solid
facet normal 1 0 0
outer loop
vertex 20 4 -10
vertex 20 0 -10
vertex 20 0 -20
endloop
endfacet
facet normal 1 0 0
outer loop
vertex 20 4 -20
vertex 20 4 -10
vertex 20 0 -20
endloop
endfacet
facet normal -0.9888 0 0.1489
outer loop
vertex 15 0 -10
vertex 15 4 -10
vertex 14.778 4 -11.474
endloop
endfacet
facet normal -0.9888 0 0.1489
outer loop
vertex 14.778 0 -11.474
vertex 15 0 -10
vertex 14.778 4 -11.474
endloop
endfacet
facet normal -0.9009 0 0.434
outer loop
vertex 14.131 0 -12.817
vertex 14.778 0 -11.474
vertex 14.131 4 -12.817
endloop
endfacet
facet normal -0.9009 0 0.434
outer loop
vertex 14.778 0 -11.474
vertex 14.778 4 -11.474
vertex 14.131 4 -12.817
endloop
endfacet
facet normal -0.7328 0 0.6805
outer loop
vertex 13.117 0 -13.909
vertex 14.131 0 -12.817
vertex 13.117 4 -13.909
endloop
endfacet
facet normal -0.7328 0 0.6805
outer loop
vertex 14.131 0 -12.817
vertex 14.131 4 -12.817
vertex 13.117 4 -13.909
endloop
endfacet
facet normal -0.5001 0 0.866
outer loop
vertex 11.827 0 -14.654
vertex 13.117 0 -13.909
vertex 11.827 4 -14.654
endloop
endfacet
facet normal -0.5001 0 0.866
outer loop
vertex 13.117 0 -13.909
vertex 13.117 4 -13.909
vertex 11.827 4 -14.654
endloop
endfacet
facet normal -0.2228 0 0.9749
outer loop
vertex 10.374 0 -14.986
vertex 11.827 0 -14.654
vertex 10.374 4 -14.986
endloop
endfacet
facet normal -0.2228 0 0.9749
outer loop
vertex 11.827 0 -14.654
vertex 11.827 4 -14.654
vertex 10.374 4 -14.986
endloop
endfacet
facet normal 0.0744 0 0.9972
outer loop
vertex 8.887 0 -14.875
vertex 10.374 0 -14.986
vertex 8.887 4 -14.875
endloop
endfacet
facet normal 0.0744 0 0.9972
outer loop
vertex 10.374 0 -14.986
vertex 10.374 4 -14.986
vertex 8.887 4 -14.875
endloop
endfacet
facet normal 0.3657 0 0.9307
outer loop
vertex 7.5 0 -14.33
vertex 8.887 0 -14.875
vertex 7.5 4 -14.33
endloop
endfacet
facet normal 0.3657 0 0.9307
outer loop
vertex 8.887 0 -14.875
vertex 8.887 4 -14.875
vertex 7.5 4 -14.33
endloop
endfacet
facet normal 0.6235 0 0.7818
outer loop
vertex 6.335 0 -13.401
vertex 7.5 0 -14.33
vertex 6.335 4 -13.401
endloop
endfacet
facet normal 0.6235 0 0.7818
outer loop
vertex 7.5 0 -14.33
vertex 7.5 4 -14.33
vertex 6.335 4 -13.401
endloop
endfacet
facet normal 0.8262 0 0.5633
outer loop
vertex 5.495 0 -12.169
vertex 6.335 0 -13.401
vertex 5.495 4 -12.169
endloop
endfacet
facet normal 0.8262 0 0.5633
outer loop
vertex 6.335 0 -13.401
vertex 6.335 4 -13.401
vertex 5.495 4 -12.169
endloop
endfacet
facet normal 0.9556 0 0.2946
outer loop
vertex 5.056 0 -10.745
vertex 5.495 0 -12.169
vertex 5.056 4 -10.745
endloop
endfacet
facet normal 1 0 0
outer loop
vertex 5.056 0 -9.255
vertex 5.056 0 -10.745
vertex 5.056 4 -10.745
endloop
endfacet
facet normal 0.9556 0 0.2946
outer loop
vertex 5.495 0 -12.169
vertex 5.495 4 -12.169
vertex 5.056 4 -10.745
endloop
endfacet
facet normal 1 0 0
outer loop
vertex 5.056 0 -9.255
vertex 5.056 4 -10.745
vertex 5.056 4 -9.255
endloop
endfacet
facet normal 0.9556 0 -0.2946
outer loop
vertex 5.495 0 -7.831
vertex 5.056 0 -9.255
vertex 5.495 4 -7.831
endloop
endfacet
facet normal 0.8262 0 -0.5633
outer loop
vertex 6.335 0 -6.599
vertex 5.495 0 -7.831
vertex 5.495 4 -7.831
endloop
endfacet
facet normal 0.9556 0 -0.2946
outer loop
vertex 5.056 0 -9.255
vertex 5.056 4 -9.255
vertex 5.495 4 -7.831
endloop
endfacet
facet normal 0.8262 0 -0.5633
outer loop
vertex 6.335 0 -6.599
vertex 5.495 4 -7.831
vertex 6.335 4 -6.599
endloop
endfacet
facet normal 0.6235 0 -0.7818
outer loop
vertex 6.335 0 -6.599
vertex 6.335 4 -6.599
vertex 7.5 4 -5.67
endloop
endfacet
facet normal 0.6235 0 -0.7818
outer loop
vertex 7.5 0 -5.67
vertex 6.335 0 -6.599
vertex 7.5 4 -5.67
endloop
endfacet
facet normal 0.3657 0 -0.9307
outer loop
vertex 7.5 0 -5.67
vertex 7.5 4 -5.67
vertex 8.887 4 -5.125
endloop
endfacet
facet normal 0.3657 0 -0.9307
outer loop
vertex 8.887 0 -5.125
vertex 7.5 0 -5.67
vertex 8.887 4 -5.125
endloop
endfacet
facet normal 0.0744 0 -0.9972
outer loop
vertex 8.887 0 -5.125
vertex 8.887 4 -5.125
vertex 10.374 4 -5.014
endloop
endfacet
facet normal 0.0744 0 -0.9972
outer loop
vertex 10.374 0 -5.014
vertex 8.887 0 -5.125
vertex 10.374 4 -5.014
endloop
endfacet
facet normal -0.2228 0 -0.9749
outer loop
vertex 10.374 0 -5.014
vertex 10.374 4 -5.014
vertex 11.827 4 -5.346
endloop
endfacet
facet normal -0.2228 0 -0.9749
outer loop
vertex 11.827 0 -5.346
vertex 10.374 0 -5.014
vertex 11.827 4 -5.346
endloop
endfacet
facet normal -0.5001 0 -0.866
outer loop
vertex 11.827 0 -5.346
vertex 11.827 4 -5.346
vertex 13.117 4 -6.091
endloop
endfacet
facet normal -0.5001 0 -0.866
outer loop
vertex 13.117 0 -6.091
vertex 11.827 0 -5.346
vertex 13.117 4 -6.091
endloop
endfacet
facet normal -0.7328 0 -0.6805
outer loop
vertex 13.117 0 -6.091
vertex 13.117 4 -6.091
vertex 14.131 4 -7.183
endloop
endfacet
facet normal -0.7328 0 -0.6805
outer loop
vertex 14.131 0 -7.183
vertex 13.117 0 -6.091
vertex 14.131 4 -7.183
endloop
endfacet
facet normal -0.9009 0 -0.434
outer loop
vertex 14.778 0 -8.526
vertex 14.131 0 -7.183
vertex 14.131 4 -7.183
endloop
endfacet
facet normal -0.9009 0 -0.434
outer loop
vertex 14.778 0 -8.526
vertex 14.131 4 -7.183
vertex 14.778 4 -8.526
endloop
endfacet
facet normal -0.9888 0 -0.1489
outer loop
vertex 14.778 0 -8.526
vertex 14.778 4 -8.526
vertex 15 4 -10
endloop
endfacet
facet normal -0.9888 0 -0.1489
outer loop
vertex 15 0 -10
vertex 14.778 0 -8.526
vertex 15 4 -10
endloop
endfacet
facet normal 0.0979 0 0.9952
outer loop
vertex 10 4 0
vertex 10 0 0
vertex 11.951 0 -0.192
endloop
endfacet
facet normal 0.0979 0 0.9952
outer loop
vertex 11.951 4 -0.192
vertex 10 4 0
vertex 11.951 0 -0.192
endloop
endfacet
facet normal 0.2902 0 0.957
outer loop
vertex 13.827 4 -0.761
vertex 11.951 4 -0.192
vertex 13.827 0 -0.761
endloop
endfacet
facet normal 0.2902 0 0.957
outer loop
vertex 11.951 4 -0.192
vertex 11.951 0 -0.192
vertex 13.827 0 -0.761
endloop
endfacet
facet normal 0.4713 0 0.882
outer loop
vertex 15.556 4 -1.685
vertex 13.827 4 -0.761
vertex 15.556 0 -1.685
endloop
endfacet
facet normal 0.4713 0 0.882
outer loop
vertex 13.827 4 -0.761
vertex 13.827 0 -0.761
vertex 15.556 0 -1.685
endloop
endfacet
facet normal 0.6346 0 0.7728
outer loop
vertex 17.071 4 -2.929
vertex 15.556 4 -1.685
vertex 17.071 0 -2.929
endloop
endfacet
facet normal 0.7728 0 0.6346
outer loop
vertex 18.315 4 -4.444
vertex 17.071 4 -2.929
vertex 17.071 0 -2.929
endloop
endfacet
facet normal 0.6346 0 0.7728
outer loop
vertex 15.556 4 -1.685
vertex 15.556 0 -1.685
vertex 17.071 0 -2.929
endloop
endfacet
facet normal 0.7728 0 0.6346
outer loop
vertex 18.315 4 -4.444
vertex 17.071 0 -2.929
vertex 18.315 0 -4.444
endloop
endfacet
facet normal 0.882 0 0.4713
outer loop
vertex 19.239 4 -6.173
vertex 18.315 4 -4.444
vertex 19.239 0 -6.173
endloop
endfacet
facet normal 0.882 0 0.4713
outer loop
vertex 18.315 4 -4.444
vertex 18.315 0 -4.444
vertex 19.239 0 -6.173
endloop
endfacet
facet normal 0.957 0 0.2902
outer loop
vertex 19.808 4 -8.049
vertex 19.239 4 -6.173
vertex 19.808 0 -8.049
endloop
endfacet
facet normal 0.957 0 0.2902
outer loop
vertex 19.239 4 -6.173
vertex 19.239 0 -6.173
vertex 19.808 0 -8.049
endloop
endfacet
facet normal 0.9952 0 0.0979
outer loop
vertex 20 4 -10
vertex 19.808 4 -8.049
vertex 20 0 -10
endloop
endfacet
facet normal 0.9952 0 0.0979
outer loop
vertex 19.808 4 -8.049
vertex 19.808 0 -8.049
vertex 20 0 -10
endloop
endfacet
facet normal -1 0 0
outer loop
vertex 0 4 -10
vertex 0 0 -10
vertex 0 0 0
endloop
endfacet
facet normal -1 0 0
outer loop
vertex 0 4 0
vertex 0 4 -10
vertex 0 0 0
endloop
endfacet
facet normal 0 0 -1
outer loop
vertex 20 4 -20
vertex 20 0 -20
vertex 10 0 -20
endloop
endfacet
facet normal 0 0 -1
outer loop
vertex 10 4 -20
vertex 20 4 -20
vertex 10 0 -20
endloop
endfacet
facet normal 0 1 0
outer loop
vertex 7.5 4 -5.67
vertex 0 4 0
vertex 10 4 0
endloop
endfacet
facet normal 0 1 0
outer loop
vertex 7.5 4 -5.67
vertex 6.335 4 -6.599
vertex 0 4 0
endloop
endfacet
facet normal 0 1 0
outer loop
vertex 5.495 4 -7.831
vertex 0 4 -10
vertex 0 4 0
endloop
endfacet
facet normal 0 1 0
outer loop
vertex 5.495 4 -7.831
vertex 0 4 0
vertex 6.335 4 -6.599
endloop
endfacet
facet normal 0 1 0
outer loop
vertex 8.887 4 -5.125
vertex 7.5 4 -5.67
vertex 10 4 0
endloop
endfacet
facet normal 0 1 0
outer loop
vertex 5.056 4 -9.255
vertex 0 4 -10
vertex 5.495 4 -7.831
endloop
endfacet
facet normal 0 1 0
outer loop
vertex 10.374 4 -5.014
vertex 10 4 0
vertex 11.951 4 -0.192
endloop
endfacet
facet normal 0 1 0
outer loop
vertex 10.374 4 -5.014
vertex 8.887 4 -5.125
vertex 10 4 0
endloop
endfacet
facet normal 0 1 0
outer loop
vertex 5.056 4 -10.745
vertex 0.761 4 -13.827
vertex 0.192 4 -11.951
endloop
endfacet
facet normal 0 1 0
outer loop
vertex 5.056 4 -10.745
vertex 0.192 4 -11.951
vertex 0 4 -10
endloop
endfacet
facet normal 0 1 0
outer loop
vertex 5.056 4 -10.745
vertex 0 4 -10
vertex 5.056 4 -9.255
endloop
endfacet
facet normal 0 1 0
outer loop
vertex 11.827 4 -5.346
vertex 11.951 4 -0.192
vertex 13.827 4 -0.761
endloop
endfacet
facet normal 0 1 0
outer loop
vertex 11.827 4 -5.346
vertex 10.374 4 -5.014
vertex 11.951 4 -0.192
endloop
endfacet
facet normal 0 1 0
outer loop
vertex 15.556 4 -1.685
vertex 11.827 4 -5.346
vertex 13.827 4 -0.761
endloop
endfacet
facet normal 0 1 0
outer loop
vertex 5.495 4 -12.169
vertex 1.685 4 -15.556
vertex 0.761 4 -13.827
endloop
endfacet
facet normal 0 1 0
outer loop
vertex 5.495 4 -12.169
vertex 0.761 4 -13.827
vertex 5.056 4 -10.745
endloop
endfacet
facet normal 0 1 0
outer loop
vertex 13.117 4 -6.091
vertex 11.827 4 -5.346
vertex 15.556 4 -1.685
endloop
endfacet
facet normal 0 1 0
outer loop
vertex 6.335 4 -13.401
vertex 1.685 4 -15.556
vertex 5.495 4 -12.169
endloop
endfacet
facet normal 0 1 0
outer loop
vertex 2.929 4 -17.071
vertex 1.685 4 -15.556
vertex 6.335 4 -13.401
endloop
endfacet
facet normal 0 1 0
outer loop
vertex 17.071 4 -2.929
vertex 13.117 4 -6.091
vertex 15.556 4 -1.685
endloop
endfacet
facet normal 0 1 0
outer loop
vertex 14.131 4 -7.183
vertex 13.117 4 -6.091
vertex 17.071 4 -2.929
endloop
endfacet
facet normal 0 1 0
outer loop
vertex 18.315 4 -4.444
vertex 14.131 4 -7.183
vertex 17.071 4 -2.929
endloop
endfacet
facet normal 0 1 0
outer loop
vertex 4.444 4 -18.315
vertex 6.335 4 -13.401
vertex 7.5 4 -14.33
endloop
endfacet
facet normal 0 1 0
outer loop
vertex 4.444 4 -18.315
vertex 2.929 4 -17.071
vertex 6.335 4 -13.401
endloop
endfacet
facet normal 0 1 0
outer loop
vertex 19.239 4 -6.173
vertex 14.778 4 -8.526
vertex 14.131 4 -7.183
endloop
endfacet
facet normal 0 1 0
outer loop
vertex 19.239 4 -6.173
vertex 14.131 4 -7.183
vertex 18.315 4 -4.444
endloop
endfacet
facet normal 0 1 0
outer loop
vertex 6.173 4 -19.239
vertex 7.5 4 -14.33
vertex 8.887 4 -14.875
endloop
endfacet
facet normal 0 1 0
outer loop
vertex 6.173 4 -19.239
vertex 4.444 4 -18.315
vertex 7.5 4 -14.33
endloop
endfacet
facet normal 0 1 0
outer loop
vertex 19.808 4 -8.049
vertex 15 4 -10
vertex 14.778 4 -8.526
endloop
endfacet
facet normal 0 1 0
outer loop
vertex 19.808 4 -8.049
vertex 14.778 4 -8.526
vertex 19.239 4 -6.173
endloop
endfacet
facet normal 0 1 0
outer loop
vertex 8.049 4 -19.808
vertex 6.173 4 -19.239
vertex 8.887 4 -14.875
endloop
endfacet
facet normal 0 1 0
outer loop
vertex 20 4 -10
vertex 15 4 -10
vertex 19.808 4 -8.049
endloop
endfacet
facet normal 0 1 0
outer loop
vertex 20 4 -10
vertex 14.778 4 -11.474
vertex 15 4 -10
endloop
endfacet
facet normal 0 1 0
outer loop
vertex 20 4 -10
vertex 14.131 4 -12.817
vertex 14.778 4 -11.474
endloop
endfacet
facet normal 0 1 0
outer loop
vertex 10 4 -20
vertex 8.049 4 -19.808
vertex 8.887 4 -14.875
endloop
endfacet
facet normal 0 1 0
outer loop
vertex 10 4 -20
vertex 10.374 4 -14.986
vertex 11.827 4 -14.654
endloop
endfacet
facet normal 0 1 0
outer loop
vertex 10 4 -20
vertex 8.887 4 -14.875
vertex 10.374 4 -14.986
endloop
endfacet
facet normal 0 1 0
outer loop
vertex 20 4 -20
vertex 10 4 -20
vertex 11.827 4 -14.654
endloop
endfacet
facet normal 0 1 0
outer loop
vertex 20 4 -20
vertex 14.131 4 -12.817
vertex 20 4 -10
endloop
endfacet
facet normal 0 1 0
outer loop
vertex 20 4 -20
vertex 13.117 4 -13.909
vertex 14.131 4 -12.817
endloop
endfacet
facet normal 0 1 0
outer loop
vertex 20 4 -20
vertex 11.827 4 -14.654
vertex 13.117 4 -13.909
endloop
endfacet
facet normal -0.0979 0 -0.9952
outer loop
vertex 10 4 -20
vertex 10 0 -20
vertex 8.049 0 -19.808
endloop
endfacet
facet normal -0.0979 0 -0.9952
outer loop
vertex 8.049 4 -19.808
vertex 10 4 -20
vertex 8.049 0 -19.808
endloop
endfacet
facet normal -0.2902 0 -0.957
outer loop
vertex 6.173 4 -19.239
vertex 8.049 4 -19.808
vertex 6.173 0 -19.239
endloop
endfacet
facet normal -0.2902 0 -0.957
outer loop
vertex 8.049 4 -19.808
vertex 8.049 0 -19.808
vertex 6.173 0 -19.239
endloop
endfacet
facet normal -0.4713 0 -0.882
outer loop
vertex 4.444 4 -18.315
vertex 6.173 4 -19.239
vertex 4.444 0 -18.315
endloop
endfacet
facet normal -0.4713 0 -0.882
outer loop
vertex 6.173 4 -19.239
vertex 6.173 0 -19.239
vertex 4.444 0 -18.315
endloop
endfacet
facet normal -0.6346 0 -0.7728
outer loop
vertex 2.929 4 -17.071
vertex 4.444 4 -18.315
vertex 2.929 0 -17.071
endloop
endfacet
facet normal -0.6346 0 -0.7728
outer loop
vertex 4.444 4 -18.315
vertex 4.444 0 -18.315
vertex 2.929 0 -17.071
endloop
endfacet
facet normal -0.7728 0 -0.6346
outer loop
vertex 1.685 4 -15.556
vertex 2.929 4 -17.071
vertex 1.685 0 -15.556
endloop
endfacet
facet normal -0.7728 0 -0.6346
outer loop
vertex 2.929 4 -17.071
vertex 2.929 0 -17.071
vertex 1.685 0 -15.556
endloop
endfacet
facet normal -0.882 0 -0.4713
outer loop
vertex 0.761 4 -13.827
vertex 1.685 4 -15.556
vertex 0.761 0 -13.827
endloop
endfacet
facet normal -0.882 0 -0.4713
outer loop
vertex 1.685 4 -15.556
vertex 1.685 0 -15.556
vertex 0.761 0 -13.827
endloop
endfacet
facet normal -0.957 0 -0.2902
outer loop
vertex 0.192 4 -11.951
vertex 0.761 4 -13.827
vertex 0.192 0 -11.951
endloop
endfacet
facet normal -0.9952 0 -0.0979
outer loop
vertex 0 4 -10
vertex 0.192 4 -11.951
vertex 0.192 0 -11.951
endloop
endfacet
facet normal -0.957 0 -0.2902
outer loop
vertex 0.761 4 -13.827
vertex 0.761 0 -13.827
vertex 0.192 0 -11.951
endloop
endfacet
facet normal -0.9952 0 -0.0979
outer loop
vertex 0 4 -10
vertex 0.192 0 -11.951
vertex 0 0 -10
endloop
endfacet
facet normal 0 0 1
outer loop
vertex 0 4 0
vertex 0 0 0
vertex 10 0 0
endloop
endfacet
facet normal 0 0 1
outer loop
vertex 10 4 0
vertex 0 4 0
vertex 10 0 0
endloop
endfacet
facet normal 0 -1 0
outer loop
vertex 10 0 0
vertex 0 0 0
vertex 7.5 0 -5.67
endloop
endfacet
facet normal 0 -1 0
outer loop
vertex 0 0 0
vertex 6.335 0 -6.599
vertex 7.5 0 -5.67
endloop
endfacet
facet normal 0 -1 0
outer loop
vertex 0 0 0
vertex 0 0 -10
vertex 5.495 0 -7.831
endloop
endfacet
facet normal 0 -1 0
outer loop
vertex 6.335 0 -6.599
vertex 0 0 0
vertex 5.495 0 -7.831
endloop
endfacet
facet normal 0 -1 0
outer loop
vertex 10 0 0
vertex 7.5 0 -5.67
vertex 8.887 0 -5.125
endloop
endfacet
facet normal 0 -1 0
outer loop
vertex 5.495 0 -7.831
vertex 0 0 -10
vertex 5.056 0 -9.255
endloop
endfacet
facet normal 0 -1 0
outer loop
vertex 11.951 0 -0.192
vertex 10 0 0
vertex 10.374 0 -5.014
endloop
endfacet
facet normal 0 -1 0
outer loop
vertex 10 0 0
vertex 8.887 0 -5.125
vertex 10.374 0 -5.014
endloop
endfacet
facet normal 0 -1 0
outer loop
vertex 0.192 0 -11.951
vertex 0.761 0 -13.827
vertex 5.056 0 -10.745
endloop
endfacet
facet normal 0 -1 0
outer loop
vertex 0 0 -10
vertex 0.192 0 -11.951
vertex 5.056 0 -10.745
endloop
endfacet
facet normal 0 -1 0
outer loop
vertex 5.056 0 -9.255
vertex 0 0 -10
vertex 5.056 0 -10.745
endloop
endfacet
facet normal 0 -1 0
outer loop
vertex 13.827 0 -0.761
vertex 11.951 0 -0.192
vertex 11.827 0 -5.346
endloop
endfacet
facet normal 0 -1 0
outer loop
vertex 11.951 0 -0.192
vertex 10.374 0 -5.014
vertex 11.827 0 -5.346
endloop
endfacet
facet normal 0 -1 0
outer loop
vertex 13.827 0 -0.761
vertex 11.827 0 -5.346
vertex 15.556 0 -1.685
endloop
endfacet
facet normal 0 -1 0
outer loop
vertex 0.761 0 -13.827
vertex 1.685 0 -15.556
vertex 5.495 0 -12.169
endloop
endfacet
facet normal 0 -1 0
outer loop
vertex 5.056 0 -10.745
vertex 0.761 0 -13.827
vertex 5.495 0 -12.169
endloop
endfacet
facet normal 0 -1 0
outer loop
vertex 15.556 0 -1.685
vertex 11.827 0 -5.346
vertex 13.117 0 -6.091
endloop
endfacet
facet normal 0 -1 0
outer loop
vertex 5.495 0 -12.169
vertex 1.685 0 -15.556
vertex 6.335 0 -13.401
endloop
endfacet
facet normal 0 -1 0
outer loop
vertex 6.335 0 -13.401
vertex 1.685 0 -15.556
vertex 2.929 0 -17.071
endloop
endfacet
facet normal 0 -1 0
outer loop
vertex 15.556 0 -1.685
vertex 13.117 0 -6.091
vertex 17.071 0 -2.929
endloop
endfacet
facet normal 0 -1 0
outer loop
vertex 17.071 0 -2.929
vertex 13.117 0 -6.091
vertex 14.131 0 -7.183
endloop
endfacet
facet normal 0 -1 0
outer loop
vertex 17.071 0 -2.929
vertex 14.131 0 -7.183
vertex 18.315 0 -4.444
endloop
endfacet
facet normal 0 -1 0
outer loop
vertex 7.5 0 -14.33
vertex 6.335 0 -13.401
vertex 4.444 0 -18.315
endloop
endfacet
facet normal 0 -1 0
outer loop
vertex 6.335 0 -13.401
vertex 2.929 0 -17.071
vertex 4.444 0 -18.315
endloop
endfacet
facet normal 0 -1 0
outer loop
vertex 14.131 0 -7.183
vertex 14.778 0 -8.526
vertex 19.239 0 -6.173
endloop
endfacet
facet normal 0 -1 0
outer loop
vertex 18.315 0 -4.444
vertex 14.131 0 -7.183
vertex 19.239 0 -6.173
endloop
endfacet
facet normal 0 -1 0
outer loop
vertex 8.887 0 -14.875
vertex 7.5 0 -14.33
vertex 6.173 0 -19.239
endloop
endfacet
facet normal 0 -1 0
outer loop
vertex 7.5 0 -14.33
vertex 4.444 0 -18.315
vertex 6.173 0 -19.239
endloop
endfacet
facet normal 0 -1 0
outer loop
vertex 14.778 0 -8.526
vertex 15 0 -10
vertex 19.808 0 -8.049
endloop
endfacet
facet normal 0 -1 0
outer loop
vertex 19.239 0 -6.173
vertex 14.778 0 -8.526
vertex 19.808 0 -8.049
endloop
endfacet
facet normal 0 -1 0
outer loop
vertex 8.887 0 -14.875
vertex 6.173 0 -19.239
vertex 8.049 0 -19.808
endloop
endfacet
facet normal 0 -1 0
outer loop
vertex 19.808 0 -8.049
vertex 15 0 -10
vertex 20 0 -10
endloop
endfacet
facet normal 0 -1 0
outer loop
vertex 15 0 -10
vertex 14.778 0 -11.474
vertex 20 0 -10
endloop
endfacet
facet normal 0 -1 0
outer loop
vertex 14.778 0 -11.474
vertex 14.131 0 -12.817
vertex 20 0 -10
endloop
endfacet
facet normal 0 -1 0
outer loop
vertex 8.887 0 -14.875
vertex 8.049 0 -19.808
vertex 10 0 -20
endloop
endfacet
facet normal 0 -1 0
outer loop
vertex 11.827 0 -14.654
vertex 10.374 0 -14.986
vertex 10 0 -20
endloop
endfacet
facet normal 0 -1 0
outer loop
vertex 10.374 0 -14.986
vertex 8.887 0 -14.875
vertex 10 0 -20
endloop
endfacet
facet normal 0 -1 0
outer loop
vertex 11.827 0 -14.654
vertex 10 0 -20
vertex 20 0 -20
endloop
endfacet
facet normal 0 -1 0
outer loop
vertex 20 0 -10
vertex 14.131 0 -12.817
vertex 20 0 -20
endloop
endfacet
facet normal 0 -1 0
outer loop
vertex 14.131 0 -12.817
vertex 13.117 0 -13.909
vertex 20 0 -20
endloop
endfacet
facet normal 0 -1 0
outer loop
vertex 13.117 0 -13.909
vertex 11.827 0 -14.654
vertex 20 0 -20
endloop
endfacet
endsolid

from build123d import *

# Parameters (mm, degrees)
EXTRUDE_1_DEPTH     = 4
SKETCH_2_R          = 5
CUT_EXTRUDE_1_DEPTH = 5


with BuildPart() as part:
    # Эскиз1 → Бобышка-Вытянуть1 (new body)
    with BuildSketch(Plane(origin=(0, 0, 0), x_dir=(1, 0, 0), z_dir=(0, 1, 0))):
        with BuildLine():
            Line((0, 0), (10, 0))
            ThreePointArc((10, 0), (17.071067812, 2.928932188), (20, 10))
            Line((20, 10), (20, 20))
            Line((20, 20), (10, 20))
            ThreePointArc((10, 20), (2.928932188, 17.071067812), (0, 10))
            Line((0, 10), (0, 0))
        make_face()
    extrude(amount=EXTRUDE_1_DEPTH)

    # Эскиз2 → Вырез-Вытянуть1 (cut, through all)
    with BuildSketch(Plane(origin=(0, 4, 0), x_dir=(1, 0, 0), z_dir=(0, 1, 0))):
        with Locations((10, 10)):
            Circle(SKETCH_2_R)
    extrude(amount=-CUT_EXTRUDE_1_DEPTH, mode=Mode.SUBTRACT)


solid = part.part
